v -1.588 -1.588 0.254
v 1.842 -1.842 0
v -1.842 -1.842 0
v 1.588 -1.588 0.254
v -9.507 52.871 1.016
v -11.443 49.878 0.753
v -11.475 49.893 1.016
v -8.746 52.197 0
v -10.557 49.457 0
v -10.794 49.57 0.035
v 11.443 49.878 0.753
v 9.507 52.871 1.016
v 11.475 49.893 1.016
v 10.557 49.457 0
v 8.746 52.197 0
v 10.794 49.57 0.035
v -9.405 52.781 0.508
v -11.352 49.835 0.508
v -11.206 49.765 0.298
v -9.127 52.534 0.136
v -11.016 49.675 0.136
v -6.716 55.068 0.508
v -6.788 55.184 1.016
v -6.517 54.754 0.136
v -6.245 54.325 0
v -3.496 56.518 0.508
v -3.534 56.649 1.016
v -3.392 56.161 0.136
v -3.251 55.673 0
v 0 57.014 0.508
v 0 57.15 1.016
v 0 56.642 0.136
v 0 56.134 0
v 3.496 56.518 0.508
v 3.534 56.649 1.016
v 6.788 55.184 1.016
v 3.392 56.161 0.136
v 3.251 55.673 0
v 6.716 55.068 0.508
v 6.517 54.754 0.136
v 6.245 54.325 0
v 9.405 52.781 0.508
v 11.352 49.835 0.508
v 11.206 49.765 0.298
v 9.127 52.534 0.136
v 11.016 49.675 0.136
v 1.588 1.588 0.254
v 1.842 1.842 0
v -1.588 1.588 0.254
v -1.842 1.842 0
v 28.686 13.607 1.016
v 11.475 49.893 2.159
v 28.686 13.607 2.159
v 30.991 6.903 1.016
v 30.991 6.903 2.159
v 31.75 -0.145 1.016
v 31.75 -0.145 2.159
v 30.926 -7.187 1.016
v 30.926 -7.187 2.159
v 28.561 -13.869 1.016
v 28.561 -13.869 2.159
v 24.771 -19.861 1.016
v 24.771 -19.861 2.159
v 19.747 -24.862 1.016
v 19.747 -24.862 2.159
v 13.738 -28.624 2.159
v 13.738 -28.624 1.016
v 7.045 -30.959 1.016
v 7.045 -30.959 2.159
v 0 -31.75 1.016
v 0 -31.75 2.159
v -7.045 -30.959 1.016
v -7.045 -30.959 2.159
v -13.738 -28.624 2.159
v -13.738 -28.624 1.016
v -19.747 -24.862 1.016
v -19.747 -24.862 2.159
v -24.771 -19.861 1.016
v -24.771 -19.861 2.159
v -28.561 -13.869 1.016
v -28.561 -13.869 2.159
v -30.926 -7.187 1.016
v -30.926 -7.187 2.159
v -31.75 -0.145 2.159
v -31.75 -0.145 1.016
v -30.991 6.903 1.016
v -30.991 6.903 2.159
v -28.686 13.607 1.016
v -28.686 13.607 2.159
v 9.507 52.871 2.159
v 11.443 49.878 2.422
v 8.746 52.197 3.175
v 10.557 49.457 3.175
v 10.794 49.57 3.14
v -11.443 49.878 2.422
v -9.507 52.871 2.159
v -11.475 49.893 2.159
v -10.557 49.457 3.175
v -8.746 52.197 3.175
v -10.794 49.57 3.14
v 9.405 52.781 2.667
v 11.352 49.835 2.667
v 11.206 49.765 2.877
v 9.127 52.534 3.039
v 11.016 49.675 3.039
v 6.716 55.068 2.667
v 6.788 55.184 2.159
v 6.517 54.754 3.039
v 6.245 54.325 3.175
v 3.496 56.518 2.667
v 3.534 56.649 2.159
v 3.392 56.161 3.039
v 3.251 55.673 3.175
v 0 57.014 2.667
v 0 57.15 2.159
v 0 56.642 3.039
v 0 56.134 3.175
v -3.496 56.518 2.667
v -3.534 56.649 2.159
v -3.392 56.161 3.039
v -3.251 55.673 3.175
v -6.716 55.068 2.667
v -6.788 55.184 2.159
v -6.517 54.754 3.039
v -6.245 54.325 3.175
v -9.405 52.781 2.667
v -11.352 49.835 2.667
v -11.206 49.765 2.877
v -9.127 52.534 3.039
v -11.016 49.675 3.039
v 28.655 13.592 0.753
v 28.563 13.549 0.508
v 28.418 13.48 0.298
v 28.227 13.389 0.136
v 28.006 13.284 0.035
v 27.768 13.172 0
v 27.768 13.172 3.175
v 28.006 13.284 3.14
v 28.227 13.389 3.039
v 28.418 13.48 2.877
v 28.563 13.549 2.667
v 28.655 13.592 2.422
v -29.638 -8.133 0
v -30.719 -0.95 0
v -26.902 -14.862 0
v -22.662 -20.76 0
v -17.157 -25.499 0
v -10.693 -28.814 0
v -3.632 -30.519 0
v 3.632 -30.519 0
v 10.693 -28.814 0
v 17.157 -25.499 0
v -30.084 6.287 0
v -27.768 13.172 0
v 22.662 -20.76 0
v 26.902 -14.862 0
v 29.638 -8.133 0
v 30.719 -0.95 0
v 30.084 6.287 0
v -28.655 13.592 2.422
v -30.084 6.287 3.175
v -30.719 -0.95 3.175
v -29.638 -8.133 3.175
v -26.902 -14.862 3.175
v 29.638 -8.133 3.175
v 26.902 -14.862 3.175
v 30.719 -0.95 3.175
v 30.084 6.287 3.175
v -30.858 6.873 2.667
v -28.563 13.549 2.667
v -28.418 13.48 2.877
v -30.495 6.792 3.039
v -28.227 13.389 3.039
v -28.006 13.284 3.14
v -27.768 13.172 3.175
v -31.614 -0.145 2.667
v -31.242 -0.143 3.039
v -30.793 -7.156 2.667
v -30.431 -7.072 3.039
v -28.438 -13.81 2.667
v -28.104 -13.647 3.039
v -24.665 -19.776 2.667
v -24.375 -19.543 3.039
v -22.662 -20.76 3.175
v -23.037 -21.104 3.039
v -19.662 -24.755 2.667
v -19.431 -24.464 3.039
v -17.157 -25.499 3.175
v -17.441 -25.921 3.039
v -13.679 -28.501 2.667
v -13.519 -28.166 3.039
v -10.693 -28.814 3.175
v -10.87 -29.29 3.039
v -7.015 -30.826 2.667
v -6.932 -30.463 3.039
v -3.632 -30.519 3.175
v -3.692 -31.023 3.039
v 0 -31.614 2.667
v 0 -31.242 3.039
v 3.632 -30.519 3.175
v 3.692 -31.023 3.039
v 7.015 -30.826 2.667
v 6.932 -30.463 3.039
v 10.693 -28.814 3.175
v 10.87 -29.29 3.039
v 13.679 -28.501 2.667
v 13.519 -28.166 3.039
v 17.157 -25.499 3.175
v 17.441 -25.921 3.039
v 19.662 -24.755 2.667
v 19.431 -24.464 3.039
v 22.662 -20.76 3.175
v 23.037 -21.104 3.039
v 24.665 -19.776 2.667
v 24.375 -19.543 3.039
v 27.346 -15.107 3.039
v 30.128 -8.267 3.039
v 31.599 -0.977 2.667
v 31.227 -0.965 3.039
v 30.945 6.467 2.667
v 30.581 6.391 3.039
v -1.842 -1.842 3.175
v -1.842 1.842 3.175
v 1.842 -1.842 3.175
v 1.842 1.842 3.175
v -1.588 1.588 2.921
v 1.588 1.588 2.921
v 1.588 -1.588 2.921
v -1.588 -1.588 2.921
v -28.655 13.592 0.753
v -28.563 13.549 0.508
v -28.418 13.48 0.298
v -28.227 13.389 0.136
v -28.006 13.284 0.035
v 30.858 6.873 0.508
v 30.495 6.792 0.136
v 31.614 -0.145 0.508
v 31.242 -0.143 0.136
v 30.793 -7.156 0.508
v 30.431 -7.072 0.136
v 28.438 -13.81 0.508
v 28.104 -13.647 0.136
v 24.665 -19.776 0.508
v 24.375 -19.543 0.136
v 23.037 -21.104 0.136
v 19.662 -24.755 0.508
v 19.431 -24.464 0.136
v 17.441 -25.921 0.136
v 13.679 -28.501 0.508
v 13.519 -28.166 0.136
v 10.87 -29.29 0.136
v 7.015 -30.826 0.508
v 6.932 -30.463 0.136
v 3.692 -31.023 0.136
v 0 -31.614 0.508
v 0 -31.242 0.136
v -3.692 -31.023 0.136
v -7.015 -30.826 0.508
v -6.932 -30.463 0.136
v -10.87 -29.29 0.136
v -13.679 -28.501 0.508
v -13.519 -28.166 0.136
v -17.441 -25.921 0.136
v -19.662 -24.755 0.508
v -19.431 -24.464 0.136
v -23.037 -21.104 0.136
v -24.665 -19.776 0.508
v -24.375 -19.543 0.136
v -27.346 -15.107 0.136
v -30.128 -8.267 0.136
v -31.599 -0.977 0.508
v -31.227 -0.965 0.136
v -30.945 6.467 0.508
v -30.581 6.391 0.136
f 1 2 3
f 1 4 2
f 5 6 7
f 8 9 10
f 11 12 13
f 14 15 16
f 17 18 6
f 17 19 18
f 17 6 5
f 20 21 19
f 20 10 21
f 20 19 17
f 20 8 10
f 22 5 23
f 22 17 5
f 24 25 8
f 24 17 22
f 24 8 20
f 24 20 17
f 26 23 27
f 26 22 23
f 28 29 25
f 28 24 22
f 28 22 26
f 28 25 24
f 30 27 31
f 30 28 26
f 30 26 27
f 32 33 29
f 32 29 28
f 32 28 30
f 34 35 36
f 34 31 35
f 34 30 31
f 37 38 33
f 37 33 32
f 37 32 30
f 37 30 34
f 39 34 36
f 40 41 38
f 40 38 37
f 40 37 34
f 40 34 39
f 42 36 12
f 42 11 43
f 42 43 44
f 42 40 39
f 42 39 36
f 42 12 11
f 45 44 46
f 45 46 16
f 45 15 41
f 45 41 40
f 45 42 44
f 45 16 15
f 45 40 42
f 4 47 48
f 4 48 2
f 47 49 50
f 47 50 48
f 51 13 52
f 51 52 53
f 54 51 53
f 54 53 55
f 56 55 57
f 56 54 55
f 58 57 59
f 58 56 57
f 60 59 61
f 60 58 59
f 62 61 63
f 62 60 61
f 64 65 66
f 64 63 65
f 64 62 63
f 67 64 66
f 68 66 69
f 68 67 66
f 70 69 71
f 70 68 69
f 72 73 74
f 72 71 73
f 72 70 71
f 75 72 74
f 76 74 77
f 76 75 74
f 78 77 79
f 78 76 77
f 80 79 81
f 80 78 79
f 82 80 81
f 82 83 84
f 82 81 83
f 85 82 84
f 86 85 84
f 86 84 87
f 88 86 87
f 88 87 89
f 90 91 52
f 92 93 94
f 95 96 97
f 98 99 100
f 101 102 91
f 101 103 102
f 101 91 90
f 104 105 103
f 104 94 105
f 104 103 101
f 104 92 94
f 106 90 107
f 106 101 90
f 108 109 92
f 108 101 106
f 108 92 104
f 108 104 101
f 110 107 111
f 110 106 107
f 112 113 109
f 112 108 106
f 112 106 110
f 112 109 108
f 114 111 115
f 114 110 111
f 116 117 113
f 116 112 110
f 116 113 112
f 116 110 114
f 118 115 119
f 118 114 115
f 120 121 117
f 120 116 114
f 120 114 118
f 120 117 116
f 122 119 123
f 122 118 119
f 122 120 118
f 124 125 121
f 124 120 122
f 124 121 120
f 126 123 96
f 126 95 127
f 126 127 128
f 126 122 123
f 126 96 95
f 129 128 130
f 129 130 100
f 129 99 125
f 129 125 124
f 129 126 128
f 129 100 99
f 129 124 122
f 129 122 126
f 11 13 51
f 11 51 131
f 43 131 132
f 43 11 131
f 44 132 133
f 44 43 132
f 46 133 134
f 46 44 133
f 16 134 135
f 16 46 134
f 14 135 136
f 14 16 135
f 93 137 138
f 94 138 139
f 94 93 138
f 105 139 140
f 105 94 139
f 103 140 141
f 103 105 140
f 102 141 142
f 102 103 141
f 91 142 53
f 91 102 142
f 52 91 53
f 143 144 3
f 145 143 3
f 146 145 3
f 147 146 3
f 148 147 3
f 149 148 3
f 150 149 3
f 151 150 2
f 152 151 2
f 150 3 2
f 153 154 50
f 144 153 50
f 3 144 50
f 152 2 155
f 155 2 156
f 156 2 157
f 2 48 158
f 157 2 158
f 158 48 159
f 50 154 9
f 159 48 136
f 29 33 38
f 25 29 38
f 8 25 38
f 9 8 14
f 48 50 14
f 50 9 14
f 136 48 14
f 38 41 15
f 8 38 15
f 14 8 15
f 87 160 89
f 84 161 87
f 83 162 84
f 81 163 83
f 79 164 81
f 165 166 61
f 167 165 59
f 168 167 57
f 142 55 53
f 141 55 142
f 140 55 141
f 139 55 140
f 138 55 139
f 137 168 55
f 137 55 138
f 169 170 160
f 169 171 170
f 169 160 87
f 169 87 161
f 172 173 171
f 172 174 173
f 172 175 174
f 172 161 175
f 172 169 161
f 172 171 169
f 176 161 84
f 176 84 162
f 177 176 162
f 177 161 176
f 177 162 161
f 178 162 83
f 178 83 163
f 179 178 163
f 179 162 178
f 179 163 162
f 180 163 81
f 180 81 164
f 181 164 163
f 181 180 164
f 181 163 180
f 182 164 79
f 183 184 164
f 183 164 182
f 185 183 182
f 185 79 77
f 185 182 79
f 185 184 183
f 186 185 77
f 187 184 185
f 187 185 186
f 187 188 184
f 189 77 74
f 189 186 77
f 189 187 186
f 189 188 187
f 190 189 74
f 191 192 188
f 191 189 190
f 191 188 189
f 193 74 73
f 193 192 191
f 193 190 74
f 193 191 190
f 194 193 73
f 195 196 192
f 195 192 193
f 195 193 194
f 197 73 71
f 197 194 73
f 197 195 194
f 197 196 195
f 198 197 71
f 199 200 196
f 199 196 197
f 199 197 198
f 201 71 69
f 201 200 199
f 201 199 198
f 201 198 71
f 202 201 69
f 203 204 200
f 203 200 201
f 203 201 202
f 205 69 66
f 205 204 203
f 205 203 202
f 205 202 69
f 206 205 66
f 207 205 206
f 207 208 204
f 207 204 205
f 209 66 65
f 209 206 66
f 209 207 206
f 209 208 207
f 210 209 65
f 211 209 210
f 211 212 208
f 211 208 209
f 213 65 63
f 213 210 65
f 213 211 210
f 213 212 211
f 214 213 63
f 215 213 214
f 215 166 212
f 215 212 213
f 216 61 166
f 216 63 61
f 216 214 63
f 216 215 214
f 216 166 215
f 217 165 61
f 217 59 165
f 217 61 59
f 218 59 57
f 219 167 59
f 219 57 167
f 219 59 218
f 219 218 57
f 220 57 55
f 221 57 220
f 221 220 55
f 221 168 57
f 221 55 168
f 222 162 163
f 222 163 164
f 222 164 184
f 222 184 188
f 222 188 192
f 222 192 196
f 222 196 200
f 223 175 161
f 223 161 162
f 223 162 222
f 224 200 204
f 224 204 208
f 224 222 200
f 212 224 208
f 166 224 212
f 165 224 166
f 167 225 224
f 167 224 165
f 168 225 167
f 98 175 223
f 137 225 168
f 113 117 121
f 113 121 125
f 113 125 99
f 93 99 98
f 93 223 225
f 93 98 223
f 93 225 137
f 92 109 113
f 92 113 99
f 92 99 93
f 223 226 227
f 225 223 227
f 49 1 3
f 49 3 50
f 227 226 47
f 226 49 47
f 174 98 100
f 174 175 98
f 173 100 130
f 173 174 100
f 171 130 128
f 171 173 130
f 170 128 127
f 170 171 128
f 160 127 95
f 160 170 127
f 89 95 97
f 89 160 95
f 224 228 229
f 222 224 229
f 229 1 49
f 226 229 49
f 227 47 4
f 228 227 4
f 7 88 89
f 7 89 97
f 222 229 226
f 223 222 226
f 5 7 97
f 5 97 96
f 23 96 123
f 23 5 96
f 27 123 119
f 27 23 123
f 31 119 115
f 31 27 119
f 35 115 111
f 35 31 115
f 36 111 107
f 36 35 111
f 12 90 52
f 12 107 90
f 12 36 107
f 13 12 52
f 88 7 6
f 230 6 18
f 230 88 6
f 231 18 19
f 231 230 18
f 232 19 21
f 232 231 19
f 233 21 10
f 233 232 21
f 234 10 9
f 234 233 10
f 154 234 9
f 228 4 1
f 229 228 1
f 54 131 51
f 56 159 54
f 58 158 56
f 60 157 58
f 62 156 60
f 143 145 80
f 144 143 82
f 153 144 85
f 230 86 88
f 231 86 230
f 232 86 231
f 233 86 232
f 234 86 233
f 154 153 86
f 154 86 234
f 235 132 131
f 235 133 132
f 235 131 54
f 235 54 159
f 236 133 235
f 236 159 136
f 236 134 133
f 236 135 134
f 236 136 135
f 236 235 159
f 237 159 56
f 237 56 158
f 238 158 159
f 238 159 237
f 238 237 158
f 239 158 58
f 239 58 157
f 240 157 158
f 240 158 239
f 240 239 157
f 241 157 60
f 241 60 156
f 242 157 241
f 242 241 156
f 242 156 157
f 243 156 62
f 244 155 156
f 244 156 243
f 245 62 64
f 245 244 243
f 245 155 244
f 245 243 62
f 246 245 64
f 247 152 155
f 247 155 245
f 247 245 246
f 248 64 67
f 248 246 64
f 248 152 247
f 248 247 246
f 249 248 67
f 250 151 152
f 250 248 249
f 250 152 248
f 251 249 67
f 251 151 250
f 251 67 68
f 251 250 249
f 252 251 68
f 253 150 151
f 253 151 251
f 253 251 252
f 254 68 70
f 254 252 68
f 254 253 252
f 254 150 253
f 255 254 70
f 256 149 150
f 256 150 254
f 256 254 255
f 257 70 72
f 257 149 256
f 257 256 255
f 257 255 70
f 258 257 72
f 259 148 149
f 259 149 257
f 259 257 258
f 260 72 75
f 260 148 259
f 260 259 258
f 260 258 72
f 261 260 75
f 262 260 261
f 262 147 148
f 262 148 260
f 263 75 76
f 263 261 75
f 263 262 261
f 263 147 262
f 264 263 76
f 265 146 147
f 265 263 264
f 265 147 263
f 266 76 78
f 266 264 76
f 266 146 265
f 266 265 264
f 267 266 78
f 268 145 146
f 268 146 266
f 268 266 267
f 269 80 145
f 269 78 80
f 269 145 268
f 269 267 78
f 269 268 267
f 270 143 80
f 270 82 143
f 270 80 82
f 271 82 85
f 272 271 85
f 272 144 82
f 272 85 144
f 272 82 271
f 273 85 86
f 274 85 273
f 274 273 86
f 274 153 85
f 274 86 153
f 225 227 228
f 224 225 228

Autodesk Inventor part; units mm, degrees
ref_plane "YZ Plane" through (0, 0, 0) normal (1, 0, 0) x (0, 1, 0)
ref_plane "XZ Plane" through (0, 0, 0) normal (0, 1, 0) x (-1, 0, 0)
ref_plane "XY Plane" through (0, 0, 0) normal (0, 0, 1) x (1, 0, 0)
sketch "Sketch2" plane through (0, 0, 0) normal (0, 0, 1) x (1, 0, 0)
  arc A0 (-28.6864, 13.6071) -> (28.6864, 13.6071) centre (0, 0) ccw
  arc A1 (11.4746, 49.8929) -> (-11.4746, 49.8929) centre (0, 44.45) ccw
  line L0 (-28.6864, 13.6071) -> (-11.4746, 49.8929)
  line L1 (11.4746, 49.8929) -> (28.6864, 13.6071)
  line L2 (-1.5875, -1.5875) -> (-1.5875, 1.5875)
  line L3 (-1.5875, 1.5875) -> (1.5875, 1.5875)
  line L4 (1.5875, 1.5875) -> (1.5875, -1.5875)
  line L5 (1.5875, -1.5875) -> (-1.5875, -1.5875)
  line L6 (-1.5875, -1.5875) -> (1.5875, 1.5875) construction
  line L7 (-1.5875, 1.5875) -> (1.5875, -1.5875) construction
  dimension "d16" = 63.5
  dimension "d18" = 25.4
  dimension "d19" = 44.45
  dimension "d22" = 3.175
  dimension "d23" = 3.175
extrude "Extrusion3" add sketch "Sketch2" along normal blind 3.175
fillet "Fillet3" radius 1.016 8 edges at (0, 57.15, 3.175) (-20.0805, 31.75, 3.175) (0, -31.75, 3.175) (20.0805, 31.75, 3.175) (0, 57.15, 0) (-20.0805, 31.75, 0) (0, -31.75, 0) (20.0805, 31.75, 0)
chamfer "Chamfer1" distance 0.254 angle 45 8 edges at (1.5875, 0, 3.175) (0, -1.5875, 3.175) (-1.5875, 0, 3.175) (0, 1.5875, 3.175) (0, -1.5875, 0) (-1.5875, 0, 0) (0, 1.5875, 0) (1.5875, 0, 0)
properties part number "4.2 Part D"
